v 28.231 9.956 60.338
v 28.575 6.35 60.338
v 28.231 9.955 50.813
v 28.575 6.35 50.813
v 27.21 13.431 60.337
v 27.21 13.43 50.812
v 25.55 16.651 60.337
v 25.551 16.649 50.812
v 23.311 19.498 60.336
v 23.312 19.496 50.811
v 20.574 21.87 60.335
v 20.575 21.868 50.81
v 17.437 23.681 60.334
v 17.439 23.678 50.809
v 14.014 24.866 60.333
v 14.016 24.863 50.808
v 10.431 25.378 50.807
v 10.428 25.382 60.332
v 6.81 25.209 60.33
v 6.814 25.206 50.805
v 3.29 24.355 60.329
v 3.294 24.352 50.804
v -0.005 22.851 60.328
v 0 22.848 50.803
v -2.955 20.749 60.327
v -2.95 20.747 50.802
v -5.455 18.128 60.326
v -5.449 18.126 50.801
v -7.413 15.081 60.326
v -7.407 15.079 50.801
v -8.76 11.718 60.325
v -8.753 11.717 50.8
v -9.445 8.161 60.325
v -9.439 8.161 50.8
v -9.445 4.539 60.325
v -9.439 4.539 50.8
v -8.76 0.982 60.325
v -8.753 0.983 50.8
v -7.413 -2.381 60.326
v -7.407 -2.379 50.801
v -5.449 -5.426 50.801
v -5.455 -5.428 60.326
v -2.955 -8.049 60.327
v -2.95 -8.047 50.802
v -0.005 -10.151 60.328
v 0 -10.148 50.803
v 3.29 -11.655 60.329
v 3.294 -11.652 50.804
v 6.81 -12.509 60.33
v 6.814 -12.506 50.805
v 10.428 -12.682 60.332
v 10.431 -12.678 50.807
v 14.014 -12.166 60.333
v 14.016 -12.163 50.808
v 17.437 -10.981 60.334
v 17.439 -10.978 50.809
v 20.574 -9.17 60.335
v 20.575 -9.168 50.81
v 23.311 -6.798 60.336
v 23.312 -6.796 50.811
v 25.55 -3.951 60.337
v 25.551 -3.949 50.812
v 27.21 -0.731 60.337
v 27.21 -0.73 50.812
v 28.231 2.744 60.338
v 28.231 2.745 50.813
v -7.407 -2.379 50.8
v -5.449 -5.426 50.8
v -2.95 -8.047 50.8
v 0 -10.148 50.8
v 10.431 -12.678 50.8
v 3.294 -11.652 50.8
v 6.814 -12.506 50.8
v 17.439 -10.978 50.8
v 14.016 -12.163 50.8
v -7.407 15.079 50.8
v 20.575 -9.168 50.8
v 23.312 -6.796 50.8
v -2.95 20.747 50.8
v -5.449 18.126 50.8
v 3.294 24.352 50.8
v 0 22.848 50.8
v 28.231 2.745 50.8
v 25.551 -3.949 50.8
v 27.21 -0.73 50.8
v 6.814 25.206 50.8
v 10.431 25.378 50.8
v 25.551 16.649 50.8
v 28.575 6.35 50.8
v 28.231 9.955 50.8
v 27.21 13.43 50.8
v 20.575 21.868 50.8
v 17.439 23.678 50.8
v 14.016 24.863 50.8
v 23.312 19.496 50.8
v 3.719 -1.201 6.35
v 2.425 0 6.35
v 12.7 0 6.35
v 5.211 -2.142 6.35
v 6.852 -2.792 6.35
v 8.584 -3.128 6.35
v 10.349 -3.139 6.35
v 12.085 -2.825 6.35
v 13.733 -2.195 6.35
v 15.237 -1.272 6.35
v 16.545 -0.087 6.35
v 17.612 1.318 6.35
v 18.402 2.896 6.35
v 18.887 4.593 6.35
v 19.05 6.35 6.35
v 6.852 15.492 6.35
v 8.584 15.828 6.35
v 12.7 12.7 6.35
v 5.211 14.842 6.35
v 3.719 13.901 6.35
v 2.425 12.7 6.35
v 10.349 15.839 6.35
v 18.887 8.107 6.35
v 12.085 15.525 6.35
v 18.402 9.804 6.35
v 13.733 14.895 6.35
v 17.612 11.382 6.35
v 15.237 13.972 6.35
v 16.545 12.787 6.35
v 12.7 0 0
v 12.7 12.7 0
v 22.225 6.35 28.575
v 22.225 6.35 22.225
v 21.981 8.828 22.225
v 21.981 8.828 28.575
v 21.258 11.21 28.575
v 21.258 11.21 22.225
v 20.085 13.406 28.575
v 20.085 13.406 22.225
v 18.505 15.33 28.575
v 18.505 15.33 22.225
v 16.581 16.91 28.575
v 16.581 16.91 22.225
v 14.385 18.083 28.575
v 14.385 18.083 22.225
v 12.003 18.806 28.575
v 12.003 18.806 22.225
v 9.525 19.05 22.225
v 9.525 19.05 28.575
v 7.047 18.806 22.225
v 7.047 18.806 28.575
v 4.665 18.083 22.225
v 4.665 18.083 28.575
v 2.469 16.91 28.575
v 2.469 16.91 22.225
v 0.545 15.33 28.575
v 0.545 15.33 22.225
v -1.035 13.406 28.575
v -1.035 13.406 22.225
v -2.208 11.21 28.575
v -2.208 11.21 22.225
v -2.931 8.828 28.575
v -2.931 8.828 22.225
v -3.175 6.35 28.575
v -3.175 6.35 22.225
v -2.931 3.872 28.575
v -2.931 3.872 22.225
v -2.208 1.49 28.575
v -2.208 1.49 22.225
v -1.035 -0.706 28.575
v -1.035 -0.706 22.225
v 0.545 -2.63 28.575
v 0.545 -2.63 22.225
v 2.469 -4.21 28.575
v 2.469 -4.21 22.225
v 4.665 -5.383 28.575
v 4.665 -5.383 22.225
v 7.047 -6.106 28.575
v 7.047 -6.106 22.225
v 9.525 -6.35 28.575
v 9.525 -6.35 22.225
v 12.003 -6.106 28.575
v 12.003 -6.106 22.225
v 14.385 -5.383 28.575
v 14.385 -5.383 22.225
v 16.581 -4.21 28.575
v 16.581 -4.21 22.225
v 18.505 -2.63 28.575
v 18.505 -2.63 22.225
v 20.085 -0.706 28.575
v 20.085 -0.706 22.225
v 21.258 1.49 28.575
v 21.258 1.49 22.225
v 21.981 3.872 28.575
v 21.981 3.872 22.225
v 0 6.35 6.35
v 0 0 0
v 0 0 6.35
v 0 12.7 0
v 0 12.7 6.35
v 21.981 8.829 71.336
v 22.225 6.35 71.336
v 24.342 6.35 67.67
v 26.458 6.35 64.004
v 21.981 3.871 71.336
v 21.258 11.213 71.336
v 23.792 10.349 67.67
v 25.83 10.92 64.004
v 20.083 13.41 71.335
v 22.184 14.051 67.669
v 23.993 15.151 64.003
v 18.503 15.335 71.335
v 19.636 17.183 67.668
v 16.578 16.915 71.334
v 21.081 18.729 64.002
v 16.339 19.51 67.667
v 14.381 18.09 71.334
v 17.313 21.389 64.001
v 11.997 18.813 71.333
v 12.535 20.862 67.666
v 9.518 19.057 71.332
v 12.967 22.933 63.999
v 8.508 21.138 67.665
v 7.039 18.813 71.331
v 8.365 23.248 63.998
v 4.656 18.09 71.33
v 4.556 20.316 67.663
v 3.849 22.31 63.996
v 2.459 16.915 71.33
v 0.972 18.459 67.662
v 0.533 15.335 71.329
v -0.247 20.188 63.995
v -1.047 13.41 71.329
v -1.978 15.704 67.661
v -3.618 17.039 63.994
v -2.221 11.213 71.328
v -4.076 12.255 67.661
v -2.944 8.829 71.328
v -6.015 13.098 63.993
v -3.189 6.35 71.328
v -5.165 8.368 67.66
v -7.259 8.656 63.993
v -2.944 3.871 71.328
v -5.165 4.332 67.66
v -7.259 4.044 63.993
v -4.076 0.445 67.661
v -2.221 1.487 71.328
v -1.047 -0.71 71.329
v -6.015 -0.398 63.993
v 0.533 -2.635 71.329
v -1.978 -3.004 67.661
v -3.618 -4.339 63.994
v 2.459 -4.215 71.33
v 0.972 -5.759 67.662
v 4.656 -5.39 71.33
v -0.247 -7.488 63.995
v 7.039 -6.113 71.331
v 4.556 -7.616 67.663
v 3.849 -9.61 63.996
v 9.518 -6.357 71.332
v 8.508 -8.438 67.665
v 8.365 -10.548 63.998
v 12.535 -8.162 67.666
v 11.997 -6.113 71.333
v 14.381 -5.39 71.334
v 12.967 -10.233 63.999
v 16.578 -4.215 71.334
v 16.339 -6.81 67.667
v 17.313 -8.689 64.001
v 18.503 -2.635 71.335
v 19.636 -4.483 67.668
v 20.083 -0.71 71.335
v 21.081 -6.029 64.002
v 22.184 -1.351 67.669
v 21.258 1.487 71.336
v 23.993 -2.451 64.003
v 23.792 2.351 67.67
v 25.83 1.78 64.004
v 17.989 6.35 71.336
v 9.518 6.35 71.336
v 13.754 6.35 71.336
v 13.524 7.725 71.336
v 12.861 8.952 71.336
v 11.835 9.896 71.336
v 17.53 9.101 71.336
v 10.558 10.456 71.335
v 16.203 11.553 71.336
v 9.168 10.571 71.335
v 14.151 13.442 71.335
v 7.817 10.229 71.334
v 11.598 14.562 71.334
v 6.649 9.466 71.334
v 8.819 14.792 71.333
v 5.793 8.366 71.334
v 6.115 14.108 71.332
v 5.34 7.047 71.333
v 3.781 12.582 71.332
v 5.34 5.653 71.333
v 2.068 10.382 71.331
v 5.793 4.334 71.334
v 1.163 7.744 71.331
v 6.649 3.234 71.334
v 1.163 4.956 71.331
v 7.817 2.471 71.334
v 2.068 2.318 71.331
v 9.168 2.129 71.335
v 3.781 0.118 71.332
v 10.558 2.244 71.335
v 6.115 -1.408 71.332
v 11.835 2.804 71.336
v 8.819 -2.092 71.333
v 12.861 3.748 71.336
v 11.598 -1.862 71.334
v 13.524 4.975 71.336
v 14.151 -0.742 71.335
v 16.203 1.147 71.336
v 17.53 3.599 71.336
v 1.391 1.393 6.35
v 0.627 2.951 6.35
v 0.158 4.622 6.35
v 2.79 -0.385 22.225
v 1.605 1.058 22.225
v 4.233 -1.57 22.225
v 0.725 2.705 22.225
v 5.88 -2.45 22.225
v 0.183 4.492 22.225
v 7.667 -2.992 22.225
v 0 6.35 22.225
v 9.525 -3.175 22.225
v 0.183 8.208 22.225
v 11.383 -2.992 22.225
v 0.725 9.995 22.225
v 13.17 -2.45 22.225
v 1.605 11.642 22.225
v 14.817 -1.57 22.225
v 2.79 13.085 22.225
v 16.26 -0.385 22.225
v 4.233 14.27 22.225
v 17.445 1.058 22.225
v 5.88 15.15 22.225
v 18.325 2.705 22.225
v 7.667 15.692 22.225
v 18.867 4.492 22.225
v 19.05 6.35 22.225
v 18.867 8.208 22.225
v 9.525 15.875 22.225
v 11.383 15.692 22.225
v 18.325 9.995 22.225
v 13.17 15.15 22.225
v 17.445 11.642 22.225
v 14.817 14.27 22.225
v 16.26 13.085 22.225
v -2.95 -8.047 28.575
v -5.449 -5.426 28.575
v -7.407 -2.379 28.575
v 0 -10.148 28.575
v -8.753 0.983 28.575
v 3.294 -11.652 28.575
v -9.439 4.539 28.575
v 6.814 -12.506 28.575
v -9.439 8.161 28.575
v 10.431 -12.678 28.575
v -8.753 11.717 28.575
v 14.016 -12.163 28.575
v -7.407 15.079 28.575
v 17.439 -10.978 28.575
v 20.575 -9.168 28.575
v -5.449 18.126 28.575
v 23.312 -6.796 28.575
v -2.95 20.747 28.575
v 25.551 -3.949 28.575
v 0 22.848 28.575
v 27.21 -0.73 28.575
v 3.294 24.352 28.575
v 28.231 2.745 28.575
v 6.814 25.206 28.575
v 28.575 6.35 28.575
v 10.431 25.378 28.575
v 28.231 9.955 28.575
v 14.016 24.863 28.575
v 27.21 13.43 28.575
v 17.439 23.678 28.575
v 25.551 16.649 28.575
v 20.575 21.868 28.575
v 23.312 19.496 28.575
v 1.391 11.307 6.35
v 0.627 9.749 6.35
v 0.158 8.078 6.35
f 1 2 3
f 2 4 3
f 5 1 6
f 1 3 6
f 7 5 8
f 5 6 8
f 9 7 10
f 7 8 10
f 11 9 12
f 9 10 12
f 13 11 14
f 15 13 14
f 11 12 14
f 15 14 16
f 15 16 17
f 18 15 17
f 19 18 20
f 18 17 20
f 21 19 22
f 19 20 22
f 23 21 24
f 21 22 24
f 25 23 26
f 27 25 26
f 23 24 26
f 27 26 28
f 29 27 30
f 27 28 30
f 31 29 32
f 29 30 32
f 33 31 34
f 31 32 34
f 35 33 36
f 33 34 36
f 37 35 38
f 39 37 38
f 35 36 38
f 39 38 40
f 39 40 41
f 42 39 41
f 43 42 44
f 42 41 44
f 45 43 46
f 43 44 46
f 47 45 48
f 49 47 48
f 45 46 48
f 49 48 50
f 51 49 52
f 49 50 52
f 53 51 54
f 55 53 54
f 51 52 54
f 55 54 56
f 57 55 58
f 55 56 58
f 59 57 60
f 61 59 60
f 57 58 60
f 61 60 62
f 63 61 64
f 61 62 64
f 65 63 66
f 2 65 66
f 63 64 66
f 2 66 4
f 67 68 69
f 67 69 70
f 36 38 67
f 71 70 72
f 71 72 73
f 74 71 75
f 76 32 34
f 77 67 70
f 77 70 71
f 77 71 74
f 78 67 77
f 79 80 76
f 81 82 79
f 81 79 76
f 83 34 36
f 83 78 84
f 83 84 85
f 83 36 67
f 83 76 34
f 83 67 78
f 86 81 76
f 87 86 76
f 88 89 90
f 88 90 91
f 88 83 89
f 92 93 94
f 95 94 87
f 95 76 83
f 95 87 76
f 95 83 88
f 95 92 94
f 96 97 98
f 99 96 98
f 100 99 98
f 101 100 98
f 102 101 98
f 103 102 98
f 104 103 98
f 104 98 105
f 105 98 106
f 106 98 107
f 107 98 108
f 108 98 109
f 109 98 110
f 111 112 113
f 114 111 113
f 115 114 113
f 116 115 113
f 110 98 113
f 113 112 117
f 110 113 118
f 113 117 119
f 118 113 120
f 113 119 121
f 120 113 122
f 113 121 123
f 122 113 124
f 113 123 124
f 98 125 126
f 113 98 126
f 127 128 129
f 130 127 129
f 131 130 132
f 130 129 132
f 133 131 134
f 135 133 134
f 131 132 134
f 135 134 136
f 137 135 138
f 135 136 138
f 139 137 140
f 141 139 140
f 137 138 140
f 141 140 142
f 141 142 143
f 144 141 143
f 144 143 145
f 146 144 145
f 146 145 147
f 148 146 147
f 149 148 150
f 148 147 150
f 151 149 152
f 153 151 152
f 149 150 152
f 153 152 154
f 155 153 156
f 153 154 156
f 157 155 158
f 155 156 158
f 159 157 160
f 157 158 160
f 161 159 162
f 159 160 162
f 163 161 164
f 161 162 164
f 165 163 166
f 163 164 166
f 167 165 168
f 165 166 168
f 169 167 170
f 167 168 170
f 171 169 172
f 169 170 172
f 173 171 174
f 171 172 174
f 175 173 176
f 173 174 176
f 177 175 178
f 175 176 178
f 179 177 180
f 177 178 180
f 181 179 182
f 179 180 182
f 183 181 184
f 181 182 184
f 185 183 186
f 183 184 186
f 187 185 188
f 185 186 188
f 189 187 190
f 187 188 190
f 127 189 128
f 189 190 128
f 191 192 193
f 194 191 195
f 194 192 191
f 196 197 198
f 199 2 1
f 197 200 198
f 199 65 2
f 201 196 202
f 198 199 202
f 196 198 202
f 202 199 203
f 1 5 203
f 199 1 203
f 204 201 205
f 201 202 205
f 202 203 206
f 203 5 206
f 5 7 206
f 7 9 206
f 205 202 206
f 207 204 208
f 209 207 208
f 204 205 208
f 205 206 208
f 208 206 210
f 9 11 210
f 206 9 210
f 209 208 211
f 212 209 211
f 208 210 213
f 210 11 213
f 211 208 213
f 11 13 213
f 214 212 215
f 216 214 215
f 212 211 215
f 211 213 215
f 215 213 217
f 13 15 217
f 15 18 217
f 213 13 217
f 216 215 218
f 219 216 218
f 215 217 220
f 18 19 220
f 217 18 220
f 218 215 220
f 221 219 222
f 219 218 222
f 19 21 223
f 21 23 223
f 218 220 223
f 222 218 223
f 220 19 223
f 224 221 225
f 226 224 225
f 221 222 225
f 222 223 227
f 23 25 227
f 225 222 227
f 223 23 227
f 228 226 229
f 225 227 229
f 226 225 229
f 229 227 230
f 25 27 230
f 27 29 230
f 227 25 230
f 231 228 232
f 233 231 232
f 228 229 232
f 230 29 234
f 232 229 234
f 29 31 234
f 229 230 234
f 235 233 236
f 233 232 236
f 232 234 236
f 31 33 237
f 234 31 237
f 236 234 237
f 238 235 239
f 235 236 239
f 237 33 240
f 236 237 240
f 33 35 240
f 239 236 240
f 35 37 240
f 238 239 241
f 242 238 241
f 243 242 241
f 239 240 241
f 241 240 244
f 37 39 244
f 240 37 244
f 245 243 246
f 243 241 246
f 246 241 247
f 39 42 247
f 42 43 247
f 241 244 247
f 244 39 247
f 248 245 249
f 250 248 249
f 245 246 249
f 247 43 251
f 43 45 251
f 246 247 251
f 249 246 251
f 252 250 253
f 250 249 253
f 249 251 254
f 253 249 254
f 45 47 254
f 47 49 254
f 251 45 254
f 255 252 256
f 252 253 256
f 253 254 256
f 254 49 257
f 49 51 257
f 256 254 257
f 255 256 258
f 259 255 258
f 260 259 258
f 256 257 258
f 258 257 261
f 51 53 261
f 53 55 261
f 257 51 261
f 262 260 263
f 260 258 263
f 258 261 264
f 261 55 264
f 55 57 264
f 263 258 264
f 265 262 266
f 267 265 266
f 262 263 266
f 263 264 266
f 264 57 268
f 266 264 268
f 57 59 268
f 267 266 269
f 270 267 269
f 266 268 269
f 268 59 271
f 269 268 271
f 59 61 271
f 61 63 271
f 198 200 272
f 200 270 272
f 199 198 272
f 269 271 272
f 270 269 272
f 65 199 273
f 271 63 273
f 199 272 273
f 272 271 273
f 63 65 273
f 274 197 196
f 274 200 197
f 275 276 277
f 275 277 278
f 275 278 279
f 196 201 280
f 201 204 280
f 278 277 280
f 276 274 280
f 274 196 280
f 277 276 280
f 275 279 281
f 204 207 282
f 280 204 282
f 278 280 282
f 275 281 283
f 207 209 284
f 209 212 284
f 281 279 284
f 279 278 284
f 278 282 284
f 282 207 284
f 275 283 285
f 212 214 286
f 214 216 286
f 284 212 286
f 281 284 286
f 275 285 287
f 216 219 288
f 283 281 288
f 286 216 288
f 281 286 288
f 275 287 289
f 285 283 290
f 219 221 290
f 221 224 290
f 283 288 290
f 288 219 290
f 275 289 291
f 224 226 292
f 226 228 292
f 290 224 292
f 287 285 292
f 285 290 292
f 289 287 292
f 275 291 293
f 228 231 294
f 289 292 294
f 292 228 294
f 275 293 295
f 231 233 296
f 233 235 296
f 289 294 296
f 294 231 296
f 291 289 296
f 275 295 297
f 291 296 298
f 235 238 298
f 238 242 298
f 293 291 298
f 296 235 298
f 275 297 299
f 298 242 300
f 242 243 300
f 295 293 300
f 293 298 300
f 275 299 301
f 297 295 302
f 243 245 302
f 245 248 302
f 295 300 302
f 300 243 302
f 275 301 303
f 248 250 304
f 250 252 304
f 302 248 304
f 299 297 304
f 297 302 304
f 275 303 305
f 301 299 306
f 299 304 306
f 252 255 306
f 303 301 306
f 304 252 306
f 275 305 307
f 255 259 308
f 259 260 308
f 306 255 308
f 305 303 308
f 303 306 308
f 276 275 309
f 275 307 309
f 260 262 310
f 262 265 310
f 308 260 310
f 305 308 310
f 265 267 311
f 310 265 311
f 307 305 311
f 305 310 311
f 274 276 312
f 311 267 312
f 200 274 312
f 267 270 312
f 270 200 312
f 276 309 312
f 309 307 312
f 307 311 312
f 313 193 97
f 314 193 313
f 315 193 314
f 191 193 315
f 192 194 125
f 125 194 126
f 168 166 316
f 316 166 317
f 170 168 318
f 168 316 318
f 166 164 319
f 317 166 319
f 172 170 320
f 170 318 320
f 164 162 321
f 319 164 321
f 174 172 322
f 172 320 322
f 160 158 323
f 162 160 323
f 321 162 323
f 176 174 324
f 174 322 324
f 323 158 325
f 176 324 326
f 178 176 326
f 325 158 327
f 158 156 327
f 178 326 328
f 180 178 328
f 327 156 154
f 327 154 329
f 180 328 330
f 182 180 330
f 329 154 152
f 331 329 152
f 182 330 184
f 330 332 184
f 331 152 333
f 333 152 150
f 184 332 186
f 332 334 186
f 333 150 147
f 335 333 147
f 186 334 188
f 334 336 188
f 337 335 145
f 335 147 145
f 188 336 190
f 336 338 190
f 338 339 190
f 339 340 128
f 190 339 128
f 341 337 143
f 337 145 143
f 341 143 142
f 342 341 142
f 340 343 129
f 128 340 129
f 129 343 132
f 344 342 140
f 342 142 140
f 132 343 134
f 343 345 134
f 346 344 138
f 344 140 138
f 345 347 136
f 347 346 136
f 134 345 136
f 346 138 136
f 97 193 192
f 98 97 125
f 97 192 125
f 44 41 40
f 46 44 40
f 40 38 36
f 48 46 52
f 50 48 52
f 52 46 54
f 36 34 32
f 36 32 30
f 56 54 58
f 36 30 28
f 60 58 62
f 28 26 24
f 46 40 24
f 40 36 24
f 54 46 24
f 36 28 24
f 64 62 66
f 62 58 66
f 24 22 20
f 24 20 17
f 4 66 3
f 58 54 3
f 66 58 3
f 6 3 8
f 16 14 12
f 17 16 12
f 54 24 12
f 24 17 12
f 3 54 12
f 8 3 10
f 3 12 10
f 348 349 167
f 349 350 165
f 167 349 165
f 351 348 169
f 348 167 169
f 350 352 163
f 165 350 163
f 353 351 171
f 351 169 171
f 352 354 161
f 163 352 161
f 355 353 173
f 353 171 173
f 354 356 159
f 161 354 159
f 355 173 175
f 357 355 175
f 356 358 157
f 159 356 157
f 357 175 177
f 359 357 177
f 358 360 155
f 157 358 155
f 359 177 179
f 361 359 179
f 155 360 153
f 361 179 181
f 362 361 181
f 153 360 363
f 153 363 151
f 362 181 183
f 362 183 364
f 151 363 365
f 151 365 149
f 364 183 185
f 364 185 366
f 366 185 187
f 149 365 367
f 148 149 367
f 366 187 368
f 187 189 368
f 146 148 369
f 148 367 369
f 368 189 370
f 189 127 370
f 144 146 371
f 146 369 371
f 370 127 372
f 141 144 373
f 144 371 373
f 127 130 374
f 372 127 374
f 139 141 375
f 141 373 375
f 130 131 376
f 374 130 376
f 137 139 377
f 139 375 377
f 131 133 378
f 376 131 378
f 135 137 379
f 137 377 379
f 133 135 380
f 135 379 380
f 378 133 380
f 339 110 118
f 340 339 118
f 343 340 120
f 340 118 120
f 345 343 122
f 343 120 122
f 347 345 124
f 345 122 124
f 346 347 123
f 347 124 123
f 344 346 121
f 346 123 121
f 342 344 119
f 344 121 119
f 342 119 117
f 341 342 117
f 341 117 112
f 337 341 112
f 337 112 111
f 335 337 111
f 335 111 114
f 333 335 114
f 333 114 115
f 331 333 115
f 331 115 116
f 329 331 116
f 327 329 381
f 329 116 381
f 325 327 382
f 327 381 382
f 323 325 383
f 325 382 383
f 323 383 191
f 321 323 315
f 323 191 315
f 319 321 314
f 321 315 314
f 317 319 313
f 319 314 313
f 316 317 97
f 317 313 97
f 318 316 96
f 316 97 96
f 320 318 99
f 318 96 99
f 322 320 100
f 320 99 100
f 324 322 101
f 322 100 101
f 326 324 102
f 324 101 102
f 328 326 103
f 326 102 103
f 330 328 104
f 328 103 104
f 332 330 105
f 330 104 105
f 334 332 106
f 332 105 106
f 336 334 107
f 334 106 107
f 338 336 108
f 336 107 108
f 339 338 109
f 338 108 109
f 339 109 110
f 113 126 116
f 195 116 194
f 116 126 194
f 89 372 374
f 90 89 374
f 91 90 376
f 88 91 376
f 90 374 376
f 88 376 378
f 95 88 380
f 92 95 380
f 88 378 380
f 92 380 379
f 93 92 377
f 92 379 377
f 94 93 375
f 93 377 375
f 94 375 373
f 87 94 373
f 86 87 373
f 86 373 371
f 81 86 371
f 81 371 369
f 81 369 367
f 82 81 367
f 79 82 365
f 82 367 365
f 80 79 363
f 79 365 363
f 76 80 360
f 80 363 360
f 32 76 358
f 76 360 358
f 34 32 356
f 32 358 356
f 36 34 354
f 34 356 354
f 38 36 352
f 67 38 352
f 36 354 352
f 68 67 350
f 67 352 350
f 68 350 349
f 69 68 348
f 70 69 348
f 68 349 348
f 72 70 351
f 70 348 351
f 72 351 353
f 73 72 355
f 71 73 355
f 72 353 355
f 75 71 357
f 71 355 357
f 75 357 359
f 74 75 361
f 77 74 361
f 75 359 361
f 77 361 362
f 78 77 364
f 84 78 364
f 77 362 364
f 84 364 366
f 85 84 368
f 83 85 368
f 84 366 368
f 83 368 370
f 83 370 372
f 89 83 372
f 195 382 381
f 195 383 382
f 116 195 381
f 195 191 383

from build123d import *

# Parameters (mm, degrees)
F0_W     = 9.525
F0_H     = 12.7
F0_W_2   = 3.175
F1_DEPTH = 6.35
F2_R     = 9.525
F3_DEPTH = 15.875
F4_R     = 12.7
F5_DEPTH = 6.35
F6_R     = 19.05
F7_DEPTH = 22.225


with BuildPart() as f1:
    # F0 (on Top) → F1 (new body)
    with BuildSketch(Plane.XY):
        with Locations((4.7625, 6.35)):
            Rectangle(F0_W, F0_H)
        with Locations((11.1125, 6.35)):
            Rectangle(F0_W_2, F0_H)
    extrude(amount=F1_DEPTH)

    # F2 (on face) → F3 (join)
    with BuildSketch(Plane.XY.offset(6.35)):
        with Locations((9.525, 6.35)):
            Circle(F2_R)
    extrude(amount=F3_DEPTH)

    # F4 (on face) → F5 (join)
    with BuildSketch(Plane.XY.offset(22.225)):
        with Locations((9.525, 6.35)):
            Circle(F4_R)
    extrude(amount=F5_DEPTH)

    # F6 (on face) → F7 (join)
    with BuildSketch(Plane.XY.offset(28.575)):
        with Locations((9.525, 6.35)):
            Circle(F6_R)
    extrude(amount=F7_DEPTH)


with BuildPart() as f10:
    # F9 (on face) → F10 (revolve)
    with BuildSketch(Plane(origin=(0, 6.35, 0), x_dir=(-1, 0, 0), z_dir=(0, 1, 0))):
        Polygon((-28.5749696195, 60.3376733482), (-28.5749696195, 50.8126733482), (-9.5249661244, 50.8063773453), (-9.5181810445, 71.3361959763), (-22.2249696195, 71.3361959763), align=None)
    revolve(axis=Axis((9.5215735845, 6.35, 61.0712866608), (-0.0003304988, 0, 0.9999999454)))


solid = Compound([f1.part, f10.part])
